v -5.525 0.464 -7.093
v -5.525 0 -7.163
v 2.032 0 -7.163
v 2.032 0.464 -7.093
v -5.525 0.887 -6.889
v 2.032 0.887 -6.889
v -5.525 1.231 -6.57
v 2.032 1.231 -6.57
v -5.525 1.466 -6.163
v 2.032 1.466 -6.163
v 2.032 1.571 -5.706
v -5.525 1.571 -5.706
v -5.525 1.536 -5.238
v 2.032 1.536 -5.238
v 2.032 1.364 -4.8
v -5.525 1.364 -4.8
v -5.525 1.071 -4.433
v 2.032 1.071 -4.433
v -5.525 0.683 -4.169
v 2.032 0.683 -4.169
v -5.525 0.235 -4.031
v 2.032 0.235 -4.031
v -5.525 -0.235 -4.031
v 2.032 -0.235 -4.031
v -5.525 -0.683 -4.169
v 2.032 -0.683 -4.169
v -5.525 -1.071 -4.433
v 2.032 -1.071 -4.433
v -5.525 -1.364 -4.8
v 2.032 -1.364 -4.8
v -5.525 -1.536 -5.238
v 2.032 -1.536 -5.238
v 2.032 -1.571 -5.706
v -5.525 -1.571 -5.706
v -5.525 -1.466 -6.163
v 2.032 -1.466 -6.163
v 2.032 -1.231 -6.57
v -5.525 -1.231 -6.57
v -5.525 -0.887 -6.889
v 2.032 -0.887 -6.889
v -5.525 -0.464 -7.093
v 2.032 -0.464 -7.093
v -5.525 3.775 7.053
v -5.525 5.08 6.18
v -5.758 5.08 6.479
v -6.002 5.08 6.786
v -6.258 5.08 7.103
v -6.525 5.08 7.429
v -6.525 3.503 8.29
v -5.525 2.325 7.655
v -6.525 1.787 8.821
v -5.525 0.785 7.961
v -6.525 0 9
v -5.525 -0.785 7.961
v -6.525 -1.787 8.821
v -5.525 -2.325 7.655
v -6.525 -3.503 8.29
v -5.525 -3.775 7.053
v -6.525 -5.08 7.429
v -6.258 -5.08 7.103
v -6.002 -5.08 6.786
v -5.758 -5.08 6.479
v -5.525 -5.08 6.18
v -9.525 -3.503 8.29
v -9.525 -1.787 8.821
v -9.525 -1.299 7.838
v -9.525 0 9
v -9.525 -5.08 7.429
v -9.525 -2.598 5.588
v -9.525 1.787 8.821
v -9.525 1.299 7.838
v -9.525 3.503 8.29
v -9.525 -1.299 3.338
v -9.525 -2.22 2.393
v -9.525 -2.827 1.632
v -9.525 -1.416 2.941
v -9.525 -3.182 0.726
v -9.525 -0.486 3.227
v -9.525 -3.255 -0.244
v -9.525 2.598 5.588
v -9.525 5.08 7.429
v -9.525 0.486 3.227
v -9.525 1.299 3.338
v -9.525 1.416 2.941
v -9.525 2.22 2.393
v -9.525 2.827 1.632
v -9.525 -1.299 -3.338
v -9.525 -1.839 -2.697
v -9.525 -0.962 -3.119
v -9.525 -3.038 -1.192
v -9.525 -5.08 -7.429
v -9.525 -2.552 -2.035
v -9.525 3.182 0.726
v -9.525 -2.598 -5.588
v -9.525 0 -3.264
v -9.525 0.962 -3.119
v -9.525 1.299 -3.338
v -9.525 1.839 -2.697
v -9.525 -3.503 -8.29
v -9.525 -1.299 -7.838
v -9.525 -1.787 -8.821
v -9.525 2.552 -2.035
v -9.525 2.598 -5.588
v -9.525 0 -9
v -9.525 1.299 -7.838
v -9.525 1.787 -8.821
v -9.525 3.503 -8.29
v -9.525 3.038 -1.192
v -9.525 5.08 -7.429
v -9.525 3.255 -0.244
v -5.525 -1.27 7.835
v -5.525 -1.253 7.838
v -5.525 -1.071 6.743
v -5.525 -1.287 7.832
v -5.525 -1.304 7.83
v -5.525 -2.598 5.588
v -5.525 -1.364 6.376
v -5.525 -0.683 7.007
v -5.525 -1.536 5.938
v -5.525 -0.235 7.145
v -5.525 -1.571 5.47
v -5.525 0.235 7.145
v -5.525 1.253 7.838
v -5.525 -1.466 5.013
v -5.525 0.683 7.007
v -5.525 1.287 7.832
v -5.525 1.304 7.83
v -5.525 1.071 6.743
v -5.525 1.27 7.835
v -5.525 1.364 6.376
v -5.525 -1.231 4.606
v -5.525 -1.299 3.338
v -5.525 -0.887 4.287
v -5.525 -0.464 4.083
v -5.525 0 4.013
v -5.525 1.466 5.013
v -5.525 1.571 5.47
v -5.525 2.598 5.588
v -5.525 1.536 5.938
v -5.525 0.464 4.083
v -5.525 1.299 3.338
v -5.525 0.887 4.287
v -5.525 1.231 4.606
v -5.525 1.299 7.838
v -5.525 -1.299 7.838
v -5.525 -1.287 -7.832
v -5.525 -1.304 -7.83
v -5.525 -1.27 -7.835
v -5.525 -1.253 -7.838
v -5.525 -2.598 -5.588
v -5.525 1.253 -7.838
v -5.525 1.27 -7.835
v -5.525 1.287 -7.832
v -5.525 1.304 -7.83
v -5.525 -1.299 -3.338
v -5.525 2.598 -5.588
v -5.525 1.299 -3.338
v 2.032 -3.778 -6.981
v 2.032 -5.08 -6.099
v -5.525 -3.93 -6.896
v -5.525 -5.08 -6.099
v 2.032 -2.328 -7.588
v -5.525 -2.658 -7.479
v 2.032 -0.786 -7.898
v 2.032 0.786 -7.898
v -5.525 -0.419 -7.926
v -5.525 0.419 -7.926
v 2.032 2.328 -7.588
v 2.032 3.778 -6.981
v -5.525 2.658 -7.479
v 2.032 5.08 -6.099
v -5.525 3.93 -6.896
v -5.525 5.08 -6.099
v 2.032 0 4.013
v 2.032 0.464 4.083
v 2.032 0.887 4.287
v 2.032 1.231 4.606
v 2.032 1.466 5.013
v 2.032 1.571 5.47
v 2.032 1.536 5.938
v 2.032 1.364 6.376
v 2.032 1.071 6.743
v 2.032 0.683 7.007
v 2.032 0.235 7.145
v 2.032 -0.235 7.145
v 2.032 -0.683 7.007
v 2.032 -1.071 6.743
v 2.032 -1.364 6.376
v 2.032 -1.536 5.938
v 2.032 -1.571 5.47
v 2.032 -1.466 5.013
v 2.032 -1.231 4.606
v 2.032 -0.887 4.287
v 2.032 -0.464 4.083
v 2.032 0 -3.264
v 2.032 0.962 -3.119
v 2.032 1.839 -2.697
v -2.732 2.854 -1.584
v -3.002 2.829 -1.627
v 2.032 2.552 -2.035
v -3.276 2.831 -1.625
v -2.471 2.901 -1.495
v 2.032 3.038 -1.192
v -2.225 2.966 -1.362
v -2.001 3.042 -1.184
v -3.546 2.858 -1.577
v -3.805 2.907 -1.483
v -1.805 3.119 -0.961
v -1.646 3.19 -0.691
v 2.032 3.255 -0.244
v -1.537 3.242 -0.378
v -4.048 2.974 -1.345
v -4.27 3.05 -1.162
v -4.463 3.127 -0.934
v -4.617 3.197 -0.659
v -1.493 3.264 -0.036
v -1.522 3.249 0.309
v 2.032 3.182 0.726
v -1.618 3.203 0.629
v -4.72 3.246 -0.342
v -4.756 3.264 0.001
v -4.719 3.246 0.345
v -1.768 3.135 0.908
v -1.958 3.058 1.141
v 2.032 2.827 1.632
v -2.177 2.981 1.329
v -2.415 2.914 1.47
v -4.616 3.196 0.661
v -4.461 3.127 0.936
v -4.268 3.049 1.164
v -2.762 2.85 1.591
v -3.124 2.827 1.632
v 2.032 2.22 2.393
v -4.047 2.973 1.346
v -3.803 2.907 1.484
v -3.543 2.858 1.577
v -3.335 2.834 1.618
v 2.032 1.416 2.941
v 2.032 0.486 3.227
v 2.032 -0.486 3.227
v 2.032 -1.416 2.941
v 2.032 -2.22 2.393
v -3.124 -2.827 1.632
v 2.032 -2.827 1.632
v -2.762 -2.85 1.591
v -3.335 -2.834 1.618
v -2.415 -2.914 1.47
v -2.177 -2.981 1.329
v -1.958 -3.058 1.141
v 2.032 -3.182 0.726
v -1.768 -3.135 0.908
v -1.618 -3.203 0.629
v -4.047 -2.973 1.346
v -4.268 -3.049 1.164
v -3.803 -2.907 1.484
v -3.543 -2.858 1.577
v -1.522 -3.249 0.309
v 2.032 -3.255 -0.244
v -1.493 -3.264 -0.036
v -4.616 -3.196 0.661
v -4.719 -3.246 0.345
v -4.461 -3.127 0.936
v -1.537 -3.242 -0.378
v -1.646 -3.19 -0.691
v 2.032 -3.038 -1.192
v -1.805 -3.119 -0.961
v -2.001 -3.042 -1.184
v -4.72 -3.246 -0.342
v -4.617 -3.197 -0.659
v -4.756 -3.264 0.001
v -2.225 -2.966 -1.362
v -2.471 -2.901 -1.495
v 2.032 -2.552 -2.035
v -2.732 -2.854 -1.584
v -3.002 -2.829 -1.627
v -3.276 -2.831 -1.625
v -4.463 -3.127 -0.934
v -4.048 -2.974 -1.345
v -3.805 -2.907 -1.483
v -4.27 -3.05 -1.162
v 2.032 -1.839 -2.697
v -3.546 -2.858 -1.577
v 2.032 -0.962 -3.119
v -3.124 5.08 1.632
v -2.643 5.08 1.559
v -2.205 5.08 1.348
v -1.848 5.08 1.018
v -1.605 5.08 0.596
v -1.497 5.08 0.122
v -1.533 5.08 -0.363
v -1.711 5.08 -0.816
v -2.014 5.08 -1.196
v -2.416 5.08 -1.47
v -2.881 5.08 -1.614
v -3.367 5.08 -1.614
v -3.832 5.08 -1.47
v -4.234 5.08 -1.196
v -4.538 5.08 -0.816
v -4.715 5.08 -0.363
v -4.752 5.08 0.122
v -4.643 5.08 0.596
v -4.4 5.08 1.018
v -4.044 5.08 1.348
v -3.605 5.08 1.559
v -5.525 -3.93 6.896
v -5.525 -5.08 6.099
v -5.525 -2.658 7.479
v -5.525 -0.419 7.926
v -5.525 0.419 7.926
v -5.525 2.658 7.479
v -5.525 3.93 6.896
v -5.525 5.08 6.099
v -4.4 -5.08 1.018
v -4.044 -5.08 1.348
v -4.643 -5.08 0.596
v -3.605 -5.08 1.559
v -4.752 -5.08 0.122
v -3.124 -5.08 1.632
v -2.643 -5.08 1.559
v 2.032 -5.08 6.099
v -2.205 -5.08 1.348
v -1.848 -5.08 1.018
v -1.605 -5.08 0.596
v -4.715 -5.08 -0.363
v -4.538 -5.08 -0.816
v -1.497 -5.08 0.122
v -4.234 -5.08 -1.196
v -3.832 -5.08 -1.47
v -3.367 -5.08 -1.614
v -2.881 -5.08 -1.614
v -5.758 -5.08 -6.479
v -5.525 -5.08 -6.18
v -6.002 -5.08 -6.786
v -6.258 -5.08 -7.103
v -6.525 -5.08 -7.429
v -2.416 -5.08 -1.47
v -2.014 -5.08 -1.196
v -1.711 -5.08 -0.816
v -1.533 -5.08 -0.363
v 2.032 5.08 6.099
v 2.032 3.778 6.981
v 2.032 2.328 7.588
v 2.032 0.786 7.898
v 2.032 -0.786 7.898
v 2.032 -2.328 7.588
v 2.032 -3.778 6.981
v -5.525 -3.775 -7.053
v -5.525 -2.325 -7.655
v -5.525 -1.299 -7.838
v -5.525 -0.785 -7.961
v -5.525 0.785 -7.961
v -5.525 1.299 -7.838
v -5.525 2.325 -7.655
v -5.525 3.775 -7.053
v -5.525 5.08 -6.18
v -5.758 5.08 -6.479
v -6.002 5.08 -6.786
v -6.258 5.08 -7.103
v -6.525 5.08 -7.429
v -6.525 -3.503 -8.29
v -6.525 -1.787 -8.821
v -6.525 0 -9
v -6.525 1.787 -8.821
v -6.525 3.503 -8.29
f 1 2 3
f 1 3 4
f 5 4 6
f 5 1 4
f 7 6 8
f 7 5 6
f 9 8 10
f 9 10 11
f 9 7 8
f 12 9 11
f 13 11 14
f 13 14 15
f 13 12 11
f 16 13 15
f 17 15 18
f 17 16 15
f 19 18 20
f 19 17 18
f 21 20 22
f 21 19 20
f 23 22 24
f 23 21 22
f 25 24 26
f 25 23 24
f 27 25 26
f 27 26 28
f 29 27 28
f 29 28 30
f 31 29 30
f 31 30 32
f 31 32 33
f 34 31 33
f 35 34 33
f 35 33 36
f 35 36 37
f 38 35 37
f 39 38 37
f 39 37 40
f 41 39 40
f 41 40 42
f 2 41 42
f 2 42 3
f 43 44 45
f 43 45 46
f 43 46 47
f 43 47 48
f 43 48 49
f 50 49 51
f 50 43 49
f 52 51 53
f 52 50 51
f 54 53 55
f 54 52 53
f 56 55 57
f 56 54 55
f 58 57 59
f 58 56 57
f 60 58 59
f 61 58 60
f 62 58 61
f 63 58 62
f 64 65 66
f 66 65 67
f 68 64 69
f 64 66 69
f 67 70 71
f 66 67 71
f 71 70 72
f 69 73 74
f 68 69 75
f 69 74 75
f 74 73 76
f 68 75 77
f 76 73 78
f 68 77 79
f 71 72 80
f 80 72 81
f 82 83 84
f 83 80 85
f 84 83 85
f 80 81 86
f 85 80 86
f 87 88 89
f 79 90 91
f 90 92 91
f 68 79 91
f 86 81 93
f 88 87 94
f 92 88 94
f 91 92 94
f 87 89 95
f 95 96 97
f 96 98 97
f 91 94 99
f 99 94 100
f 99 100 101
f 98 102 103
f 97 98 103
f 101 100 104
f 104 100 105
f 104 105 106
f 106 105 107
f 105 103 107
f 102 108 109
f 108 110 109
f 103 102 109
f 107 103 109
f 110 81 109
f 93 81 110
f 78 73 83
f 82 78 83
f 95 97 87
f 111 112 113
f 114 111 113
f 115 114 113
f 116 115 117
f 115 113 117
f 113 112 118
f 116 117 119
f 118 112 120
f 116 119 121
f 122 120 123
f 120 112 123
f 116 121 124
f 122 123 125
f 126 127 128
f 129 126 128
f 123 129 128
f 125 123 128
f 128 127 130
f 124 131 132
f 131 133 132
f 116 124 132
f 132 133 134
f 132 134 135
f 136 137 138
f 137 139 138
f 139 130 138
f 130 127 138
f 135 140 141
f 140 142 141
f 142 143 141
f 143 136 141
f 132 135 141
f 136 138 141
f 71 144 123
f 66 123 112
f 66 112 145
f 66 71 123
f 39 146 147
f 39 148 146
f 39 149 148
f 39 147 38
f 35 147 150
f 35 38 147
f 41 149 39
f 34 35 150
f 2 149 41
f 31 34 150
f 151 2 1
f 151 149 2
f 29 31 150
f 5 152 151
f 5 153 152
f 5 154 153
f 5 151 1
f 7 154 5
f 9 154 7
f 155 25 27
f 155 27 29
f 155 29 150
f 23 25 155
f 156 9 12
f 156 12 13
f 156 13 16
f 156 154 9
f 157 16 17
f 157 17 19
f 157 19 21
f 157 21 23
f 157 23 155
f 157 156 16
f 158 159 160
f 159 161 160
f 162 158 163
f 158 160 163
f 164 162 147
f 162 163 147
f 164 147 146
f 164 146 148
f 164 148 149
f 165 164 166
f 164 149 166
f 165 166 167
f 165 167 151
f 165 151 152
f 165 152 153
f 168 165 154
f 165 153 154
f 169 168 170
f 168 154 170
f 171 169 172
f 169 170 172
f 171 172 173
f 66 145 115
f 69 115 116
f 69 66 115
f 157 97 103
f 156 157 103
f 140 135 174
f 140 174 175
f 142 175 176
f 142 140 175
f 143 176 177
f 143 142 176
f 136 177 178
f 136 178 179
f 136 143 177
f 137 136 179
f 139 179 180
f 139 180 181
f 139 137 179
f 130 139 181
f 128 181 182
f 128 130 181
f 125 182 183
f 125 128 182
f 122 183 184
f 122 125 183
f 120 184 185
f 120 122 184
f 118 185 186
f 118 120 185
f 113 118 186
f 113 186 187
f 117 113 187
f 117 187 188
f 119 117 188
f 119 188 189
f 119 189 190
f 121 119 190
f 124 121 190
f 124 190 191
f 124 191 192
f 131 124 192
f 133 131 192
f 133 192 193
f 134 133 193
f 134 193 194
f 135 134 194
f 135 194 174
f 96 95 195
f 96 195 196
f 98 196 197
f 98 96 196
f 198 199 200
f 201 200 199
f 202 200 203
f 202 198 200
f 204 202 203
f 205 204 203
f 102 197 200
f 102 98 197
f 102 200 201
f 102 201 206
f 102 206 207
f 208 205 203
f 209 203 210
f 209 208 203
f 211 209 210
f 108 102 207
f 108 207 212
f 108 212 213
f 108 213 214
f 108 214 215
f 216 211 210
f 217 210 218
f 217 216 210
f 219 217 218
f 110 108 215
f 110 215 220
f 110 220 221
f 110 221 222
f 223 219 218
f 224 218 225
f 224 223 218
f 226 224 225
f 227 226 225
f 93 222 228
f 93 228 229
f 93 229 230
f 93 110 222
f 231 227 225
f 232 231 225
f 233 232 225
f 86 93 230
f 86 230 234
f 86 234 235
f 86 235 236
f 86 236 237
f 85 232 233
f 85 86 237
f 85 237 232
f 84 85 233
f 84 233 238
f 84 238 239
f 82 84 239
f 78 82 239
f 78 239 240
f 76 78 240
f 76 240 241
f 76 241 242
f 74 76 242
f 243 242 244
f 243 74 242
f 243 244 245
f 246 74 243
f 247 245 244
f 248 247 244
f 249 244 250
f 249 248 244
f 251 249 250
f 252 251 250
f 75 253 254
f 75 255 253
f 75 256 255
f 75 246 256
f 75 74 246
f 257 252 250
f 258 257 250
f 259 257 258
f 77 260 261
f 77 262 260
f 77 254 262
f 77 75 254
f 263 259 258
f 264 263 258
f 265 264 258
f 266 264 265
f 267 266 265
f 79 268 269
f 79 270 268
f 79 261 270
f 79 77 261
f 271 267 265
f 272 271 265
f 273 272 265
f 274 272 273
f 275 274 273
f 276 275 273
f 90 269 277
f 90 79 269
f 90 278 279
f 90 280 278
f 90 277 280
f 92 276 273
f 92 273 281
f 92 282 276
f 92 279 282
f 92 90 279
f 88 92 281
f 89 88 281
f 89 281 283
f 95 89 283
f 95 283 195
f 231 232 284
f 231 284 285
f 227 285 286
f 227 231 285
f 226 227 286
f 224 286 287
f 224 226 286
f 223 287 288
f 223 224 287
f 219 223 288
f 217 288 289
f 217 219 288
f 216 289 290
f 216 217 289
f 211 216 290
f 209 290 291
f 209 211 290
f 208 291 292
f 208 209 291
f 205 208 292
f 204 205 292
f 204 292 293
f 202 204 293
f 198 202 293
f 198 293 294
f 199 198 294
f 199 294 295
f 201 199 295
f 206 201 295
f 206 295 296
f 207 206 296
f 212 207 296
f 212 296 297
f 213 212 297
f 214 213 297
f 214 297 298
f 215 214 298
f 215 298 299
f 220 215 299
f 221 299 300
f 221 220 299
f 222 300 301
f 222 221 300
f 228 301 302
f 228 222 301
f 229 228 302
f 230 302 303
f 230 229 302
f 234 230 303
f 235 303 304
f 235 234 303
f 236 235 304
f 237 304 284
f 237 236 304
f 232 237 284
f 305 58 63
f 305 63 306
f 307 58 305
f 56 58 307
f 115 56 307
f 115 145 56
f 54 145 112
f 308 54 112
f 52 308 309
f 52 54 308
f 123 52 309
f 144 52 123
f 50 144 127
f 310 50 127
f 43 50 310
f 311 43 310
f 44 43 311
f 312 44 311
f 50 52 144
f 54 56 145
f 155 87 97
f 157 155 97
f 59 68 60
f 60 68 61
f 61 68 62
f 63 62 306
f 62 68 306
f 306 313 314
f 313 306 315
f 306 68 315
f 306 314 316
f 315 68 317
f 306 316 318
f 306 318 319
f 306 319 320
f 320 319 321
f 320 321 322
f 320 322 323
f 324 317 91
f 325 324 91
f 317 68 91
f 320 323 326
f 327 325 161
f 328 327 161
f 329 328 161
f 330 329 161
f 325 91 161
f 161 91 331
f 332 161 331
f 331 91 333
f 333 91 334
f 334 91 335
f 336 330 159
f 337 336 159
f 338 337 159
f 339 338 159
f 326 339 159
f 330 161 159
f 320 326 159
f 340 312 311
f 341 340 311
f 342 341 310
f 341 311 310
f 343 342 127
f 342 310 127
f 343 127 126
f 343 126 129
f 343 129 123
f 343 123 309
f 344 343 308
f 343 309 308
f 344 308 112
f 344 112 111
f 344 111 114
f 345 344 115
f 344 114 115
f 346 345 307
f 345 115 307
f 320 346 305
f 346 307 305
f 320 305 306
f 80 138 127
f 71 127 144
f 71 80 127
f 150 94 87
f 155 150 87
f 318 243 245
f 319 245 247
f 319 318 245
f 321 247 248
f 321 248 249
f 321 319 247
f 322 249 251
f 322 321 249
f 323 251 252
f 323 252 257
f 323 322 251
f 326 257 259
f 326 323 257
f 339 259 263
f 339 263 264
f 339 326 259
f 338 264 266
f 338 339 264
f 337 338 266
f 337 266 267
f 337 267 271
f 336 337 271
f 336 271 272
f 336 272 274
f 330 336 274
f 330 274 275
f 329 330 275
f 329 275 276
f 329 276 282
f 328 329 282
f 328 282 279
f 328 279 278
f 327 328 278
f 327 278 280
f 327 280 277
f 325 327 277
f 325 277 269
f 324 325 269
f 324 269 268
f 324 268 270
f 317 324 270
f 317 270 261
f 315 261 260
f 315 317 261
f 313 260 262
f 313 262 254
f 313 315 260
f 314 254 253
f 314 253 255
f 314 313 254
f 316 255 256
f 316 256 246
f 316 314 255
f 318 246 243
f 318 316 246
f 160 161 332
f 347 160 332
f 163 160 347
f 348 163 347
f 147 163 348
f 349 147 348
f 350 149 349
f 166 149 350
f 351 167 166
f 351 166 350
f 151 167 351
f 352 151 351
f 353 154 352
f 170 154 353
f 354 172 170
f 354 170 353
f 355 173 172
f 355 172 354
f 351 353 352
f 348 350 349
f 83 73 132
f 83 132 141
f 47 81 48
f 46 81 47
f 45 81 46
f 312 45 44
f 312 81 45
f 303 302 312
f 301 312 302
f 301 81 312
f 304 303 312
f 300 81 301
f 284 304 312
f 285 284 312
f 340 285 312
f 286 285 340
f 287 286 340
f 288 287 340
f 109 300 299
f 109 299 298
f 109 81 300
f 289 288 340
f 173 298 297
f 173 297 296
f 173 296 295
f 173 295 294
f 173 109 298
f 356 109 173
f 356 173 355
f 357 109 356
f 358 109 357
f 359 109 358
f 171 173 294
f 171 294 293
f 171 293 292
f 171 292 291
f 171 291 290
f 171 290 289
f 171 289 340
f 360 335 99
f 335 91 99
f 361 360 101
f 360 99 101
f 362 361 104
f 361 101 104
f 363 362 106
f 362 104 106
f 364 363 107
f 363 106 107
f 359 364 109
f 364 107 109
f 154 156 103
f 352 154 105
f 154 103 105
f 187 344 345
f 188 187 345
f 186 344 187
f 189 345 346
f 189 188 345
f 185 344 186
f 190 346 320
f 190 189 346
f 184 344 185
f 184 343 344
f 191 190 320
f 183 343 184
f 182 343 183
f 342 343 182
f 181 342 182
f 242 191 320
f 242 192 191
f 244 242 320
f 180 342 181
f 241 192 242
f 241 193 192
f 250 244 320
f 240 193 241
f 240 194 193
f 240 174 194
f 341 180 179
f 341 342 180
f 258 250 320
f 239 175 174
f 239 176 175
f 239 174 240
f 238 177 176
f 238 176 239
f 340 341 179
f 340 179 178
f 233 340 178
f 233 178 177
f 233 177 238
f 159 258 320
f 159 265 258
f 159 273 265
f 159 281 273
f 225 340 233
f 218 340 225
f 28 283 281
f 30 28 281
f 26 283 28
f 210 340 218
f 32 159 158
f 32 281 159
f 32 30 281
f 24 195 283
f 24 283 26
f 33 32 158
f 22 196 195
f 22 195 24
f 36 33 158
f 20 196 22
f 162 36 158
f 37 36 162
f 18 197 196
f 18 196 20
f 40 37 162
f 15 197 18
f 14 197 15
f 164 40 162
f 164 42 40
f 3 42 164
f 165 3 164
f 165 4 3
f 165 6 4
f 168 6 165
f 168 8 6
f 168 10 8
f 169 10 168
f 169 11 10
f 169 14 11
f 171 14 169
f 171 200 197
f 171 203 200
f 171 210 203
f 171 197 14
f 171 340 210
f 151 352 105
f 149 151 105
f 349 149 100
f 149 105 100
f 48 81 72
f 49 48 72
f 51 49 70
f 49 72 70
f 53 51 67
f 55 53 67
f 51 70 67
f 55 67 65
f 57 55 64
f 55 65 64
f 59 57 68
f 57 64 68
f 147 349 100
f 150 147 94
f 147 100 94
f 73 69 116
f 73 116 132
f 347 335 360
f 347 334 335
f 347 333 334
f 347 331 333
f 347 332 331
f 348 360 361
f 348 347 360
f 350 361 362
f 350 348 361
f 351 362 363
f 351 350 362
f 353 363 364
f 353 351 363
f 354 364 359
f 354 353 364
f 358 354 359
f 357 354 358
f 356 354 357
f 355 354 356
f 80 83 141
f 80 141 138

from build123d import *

# Parameters (mm, degrees)
SKETCH1_R                 = 7.9375
SKETCH1_R_2               = 1.575
SKETCH1_R_3               = 3.2639
INNER_SIDE_EXTRUDE_DEPTH  = 2.032
OUTER_START               = -9.525
SKETCH1_3_R               = 7.9375
SKETCH1_3_R_2             = 1.575
SKETCH1_3_R_3             = 3.2639
OUTER_SIDE_EXTRUDE_DEPTH  = 9.525
CLEVIS_PIN_CUT_DEPTH      = 15.721869362
CLEVIS_PIN_CUT_DEPTH_BACK = 15.721869362
SKETCH2_R                 = 1.63195
SKETCH3_R                 = 9
SKETCH3_R_2               = 7.9375
BOSS_EXTRUDE1_DEPTH       = 4
SKETCH4_R                 = 1.575
CUT_EXTRUDE1_DEPTH        = 4
CHAMFER1_SIZE             = 1
CUT_EXTRUDE2_DEPTH        = 16.897346537
CUT_EXTRUDE2_DEPTH_BACK   = 16.897346537
SKETCH5_W                 = 16.51
SKETCH5_H                 = 4.312866645


with BuildPart() as part:
    # Sketch1 → Inner Side Extrude (new body)
    with BuildSketch(Plane(origin=(0, 0, 0), x_dir=(0, 0, -1), z_dir=(1, 0, 0))):
        Circle(SKETCH1_R)
        with Locations((5.588, 0)):
            Circle(SKETCH1_R_2, mode=Mode.SUBTRACT)
        with Locations((-5.588, 0)):
            Circle(SKETCH1_R_2, mode=Mode.SUBTRACT)
        Circle(SKETCH1_R_3, mode=Mode.SUBTRACT)
    extrude(amount=INNER_SIDE_EXTRUDE_DEPTH)

    # Sketch1<3> → Outer Side Extrude (add)
    with BuildSketch(Plane(origin=(0, 0, 0), x_dir=(0, 0, -1), z_dir=(1, 0, 0)).offset(OUTER_START)):
        Circle(SKETCH1_3_R)
        with Locations((5.588, 0)):
            Circle(SKETCH1_3_R_2, mode=Mode.SUBTRACT)
        with Locations((-5.588, 0)):
            Circle(SKETCH1_3_R_2, mode=Mode.SUBTRACT)
        Circle(SKETCH1_3_R_3, mode=Mode.SUBTRACT)
    extrude(amount=OUTER_SIDE_EXTRUDE_DEPTH)

    # Sketch2 → Clevis Pin Cut (cut, two sides: drawn at the far end of the back side and taken through both)
    with BuildSketch(Plane(origin=(0, 0, 0), x_dir=(1, 0, 0), z_dir=(0, 1, 0)).offset(-CLEVIS_PIN_CUT_DEPTH_BACK)):
        with Locations((-3.1242, 0)):
            Circle(SKETCH2_R)
    extrude(amount=CLEVIS_PIN_CUT_DEPTH + CLEVIS_PIN_CUT_DEPTH_BACK, mode=Mode.SUBTRACT)

    # Sketch3 → Boss-Extrude1 (add)
    with BuildSketch(Plane(origin=(-9.525, 0, 0), x_dir=(0, 0, -1), z_dir=(1, 0, 0))):
        Circle(SKETCH3_R)
        Circle(SKETCH3_R_2, mode=Mode.SUBTRACT)
    extrude(amount=BOSS_EXTRUDE1_DEPTH)

    # Sketch4 → Cut-Extrude1 (cut)
    # profile 1 of 2: a face of its own
    with BuildSketch(Plane(origin=(-9.525, 0, 0), x_dir=(0, 0, -1), z_dir=(1, 0, 0))):
        Polygon((-3.338, 1.299038106), (-5.588, 2.598076211), (-7.838, 1.299038106), (-7.838, -1.299038106), (-5.588, -2.598076211), (-3.338, -1.299038106), align=None)
        with Locations((-5.588, 0)):
            Circle(SKETCH4_R, mode=Mode.SUBTRACT)
    # profile 2 of 2: a face of its own
    with BuildSketch(Plane(origin=(-9.525, 0, 0), x_dir=(0, 0, -1), z_dir=(1, 0, 0))):
        Polygon((5.588, 2.598076211), (3.338, 1.299038106), (3.338, -1.299038106), (5.588, -2.598076211), (7.838, -1.299038106), (7.838, 1.299038106), align=None)
        with Locations((5.588, 0)):
            Circle(SKETCH4_R, mode=Mode.SUBTRACT)
    extrude(amount=CUT_EXTRUDE1_DEPTH, mode=Mode.SUBTRACT)

    # Chamfer1
    chamfer1_edges = [part.edges().sort_by_distance(p)[0] for p in [
        (-5.525, 0, 9),
    ]]
    chamfer(chamfer1_edges, length=CHAMFER1_SIZE)

    # Sketch5 → Cut-Extrude2 (cut, two sides: drawn at the far end of the back side and taken through both)
    with BuildSketch(Plane.XY.offset(-CUT_EXTRUDE2_DEPTH_BACK)):
        with Locations((-3.1242, 7.236433322)):
            Rectangle(SKETCH5_W, SKETCH5_H)
        with Locations((-3.1242, -7.236433322)):
            Rectangle(SKETCH5_W, SKETCH5_H)
    extrude(amount=CUT_EXTRUDE2_DEPTH + CUT_EXTRUDE2_DEPTH_BACK, mode=Mode.SUBTRACT)


solid = part.part
